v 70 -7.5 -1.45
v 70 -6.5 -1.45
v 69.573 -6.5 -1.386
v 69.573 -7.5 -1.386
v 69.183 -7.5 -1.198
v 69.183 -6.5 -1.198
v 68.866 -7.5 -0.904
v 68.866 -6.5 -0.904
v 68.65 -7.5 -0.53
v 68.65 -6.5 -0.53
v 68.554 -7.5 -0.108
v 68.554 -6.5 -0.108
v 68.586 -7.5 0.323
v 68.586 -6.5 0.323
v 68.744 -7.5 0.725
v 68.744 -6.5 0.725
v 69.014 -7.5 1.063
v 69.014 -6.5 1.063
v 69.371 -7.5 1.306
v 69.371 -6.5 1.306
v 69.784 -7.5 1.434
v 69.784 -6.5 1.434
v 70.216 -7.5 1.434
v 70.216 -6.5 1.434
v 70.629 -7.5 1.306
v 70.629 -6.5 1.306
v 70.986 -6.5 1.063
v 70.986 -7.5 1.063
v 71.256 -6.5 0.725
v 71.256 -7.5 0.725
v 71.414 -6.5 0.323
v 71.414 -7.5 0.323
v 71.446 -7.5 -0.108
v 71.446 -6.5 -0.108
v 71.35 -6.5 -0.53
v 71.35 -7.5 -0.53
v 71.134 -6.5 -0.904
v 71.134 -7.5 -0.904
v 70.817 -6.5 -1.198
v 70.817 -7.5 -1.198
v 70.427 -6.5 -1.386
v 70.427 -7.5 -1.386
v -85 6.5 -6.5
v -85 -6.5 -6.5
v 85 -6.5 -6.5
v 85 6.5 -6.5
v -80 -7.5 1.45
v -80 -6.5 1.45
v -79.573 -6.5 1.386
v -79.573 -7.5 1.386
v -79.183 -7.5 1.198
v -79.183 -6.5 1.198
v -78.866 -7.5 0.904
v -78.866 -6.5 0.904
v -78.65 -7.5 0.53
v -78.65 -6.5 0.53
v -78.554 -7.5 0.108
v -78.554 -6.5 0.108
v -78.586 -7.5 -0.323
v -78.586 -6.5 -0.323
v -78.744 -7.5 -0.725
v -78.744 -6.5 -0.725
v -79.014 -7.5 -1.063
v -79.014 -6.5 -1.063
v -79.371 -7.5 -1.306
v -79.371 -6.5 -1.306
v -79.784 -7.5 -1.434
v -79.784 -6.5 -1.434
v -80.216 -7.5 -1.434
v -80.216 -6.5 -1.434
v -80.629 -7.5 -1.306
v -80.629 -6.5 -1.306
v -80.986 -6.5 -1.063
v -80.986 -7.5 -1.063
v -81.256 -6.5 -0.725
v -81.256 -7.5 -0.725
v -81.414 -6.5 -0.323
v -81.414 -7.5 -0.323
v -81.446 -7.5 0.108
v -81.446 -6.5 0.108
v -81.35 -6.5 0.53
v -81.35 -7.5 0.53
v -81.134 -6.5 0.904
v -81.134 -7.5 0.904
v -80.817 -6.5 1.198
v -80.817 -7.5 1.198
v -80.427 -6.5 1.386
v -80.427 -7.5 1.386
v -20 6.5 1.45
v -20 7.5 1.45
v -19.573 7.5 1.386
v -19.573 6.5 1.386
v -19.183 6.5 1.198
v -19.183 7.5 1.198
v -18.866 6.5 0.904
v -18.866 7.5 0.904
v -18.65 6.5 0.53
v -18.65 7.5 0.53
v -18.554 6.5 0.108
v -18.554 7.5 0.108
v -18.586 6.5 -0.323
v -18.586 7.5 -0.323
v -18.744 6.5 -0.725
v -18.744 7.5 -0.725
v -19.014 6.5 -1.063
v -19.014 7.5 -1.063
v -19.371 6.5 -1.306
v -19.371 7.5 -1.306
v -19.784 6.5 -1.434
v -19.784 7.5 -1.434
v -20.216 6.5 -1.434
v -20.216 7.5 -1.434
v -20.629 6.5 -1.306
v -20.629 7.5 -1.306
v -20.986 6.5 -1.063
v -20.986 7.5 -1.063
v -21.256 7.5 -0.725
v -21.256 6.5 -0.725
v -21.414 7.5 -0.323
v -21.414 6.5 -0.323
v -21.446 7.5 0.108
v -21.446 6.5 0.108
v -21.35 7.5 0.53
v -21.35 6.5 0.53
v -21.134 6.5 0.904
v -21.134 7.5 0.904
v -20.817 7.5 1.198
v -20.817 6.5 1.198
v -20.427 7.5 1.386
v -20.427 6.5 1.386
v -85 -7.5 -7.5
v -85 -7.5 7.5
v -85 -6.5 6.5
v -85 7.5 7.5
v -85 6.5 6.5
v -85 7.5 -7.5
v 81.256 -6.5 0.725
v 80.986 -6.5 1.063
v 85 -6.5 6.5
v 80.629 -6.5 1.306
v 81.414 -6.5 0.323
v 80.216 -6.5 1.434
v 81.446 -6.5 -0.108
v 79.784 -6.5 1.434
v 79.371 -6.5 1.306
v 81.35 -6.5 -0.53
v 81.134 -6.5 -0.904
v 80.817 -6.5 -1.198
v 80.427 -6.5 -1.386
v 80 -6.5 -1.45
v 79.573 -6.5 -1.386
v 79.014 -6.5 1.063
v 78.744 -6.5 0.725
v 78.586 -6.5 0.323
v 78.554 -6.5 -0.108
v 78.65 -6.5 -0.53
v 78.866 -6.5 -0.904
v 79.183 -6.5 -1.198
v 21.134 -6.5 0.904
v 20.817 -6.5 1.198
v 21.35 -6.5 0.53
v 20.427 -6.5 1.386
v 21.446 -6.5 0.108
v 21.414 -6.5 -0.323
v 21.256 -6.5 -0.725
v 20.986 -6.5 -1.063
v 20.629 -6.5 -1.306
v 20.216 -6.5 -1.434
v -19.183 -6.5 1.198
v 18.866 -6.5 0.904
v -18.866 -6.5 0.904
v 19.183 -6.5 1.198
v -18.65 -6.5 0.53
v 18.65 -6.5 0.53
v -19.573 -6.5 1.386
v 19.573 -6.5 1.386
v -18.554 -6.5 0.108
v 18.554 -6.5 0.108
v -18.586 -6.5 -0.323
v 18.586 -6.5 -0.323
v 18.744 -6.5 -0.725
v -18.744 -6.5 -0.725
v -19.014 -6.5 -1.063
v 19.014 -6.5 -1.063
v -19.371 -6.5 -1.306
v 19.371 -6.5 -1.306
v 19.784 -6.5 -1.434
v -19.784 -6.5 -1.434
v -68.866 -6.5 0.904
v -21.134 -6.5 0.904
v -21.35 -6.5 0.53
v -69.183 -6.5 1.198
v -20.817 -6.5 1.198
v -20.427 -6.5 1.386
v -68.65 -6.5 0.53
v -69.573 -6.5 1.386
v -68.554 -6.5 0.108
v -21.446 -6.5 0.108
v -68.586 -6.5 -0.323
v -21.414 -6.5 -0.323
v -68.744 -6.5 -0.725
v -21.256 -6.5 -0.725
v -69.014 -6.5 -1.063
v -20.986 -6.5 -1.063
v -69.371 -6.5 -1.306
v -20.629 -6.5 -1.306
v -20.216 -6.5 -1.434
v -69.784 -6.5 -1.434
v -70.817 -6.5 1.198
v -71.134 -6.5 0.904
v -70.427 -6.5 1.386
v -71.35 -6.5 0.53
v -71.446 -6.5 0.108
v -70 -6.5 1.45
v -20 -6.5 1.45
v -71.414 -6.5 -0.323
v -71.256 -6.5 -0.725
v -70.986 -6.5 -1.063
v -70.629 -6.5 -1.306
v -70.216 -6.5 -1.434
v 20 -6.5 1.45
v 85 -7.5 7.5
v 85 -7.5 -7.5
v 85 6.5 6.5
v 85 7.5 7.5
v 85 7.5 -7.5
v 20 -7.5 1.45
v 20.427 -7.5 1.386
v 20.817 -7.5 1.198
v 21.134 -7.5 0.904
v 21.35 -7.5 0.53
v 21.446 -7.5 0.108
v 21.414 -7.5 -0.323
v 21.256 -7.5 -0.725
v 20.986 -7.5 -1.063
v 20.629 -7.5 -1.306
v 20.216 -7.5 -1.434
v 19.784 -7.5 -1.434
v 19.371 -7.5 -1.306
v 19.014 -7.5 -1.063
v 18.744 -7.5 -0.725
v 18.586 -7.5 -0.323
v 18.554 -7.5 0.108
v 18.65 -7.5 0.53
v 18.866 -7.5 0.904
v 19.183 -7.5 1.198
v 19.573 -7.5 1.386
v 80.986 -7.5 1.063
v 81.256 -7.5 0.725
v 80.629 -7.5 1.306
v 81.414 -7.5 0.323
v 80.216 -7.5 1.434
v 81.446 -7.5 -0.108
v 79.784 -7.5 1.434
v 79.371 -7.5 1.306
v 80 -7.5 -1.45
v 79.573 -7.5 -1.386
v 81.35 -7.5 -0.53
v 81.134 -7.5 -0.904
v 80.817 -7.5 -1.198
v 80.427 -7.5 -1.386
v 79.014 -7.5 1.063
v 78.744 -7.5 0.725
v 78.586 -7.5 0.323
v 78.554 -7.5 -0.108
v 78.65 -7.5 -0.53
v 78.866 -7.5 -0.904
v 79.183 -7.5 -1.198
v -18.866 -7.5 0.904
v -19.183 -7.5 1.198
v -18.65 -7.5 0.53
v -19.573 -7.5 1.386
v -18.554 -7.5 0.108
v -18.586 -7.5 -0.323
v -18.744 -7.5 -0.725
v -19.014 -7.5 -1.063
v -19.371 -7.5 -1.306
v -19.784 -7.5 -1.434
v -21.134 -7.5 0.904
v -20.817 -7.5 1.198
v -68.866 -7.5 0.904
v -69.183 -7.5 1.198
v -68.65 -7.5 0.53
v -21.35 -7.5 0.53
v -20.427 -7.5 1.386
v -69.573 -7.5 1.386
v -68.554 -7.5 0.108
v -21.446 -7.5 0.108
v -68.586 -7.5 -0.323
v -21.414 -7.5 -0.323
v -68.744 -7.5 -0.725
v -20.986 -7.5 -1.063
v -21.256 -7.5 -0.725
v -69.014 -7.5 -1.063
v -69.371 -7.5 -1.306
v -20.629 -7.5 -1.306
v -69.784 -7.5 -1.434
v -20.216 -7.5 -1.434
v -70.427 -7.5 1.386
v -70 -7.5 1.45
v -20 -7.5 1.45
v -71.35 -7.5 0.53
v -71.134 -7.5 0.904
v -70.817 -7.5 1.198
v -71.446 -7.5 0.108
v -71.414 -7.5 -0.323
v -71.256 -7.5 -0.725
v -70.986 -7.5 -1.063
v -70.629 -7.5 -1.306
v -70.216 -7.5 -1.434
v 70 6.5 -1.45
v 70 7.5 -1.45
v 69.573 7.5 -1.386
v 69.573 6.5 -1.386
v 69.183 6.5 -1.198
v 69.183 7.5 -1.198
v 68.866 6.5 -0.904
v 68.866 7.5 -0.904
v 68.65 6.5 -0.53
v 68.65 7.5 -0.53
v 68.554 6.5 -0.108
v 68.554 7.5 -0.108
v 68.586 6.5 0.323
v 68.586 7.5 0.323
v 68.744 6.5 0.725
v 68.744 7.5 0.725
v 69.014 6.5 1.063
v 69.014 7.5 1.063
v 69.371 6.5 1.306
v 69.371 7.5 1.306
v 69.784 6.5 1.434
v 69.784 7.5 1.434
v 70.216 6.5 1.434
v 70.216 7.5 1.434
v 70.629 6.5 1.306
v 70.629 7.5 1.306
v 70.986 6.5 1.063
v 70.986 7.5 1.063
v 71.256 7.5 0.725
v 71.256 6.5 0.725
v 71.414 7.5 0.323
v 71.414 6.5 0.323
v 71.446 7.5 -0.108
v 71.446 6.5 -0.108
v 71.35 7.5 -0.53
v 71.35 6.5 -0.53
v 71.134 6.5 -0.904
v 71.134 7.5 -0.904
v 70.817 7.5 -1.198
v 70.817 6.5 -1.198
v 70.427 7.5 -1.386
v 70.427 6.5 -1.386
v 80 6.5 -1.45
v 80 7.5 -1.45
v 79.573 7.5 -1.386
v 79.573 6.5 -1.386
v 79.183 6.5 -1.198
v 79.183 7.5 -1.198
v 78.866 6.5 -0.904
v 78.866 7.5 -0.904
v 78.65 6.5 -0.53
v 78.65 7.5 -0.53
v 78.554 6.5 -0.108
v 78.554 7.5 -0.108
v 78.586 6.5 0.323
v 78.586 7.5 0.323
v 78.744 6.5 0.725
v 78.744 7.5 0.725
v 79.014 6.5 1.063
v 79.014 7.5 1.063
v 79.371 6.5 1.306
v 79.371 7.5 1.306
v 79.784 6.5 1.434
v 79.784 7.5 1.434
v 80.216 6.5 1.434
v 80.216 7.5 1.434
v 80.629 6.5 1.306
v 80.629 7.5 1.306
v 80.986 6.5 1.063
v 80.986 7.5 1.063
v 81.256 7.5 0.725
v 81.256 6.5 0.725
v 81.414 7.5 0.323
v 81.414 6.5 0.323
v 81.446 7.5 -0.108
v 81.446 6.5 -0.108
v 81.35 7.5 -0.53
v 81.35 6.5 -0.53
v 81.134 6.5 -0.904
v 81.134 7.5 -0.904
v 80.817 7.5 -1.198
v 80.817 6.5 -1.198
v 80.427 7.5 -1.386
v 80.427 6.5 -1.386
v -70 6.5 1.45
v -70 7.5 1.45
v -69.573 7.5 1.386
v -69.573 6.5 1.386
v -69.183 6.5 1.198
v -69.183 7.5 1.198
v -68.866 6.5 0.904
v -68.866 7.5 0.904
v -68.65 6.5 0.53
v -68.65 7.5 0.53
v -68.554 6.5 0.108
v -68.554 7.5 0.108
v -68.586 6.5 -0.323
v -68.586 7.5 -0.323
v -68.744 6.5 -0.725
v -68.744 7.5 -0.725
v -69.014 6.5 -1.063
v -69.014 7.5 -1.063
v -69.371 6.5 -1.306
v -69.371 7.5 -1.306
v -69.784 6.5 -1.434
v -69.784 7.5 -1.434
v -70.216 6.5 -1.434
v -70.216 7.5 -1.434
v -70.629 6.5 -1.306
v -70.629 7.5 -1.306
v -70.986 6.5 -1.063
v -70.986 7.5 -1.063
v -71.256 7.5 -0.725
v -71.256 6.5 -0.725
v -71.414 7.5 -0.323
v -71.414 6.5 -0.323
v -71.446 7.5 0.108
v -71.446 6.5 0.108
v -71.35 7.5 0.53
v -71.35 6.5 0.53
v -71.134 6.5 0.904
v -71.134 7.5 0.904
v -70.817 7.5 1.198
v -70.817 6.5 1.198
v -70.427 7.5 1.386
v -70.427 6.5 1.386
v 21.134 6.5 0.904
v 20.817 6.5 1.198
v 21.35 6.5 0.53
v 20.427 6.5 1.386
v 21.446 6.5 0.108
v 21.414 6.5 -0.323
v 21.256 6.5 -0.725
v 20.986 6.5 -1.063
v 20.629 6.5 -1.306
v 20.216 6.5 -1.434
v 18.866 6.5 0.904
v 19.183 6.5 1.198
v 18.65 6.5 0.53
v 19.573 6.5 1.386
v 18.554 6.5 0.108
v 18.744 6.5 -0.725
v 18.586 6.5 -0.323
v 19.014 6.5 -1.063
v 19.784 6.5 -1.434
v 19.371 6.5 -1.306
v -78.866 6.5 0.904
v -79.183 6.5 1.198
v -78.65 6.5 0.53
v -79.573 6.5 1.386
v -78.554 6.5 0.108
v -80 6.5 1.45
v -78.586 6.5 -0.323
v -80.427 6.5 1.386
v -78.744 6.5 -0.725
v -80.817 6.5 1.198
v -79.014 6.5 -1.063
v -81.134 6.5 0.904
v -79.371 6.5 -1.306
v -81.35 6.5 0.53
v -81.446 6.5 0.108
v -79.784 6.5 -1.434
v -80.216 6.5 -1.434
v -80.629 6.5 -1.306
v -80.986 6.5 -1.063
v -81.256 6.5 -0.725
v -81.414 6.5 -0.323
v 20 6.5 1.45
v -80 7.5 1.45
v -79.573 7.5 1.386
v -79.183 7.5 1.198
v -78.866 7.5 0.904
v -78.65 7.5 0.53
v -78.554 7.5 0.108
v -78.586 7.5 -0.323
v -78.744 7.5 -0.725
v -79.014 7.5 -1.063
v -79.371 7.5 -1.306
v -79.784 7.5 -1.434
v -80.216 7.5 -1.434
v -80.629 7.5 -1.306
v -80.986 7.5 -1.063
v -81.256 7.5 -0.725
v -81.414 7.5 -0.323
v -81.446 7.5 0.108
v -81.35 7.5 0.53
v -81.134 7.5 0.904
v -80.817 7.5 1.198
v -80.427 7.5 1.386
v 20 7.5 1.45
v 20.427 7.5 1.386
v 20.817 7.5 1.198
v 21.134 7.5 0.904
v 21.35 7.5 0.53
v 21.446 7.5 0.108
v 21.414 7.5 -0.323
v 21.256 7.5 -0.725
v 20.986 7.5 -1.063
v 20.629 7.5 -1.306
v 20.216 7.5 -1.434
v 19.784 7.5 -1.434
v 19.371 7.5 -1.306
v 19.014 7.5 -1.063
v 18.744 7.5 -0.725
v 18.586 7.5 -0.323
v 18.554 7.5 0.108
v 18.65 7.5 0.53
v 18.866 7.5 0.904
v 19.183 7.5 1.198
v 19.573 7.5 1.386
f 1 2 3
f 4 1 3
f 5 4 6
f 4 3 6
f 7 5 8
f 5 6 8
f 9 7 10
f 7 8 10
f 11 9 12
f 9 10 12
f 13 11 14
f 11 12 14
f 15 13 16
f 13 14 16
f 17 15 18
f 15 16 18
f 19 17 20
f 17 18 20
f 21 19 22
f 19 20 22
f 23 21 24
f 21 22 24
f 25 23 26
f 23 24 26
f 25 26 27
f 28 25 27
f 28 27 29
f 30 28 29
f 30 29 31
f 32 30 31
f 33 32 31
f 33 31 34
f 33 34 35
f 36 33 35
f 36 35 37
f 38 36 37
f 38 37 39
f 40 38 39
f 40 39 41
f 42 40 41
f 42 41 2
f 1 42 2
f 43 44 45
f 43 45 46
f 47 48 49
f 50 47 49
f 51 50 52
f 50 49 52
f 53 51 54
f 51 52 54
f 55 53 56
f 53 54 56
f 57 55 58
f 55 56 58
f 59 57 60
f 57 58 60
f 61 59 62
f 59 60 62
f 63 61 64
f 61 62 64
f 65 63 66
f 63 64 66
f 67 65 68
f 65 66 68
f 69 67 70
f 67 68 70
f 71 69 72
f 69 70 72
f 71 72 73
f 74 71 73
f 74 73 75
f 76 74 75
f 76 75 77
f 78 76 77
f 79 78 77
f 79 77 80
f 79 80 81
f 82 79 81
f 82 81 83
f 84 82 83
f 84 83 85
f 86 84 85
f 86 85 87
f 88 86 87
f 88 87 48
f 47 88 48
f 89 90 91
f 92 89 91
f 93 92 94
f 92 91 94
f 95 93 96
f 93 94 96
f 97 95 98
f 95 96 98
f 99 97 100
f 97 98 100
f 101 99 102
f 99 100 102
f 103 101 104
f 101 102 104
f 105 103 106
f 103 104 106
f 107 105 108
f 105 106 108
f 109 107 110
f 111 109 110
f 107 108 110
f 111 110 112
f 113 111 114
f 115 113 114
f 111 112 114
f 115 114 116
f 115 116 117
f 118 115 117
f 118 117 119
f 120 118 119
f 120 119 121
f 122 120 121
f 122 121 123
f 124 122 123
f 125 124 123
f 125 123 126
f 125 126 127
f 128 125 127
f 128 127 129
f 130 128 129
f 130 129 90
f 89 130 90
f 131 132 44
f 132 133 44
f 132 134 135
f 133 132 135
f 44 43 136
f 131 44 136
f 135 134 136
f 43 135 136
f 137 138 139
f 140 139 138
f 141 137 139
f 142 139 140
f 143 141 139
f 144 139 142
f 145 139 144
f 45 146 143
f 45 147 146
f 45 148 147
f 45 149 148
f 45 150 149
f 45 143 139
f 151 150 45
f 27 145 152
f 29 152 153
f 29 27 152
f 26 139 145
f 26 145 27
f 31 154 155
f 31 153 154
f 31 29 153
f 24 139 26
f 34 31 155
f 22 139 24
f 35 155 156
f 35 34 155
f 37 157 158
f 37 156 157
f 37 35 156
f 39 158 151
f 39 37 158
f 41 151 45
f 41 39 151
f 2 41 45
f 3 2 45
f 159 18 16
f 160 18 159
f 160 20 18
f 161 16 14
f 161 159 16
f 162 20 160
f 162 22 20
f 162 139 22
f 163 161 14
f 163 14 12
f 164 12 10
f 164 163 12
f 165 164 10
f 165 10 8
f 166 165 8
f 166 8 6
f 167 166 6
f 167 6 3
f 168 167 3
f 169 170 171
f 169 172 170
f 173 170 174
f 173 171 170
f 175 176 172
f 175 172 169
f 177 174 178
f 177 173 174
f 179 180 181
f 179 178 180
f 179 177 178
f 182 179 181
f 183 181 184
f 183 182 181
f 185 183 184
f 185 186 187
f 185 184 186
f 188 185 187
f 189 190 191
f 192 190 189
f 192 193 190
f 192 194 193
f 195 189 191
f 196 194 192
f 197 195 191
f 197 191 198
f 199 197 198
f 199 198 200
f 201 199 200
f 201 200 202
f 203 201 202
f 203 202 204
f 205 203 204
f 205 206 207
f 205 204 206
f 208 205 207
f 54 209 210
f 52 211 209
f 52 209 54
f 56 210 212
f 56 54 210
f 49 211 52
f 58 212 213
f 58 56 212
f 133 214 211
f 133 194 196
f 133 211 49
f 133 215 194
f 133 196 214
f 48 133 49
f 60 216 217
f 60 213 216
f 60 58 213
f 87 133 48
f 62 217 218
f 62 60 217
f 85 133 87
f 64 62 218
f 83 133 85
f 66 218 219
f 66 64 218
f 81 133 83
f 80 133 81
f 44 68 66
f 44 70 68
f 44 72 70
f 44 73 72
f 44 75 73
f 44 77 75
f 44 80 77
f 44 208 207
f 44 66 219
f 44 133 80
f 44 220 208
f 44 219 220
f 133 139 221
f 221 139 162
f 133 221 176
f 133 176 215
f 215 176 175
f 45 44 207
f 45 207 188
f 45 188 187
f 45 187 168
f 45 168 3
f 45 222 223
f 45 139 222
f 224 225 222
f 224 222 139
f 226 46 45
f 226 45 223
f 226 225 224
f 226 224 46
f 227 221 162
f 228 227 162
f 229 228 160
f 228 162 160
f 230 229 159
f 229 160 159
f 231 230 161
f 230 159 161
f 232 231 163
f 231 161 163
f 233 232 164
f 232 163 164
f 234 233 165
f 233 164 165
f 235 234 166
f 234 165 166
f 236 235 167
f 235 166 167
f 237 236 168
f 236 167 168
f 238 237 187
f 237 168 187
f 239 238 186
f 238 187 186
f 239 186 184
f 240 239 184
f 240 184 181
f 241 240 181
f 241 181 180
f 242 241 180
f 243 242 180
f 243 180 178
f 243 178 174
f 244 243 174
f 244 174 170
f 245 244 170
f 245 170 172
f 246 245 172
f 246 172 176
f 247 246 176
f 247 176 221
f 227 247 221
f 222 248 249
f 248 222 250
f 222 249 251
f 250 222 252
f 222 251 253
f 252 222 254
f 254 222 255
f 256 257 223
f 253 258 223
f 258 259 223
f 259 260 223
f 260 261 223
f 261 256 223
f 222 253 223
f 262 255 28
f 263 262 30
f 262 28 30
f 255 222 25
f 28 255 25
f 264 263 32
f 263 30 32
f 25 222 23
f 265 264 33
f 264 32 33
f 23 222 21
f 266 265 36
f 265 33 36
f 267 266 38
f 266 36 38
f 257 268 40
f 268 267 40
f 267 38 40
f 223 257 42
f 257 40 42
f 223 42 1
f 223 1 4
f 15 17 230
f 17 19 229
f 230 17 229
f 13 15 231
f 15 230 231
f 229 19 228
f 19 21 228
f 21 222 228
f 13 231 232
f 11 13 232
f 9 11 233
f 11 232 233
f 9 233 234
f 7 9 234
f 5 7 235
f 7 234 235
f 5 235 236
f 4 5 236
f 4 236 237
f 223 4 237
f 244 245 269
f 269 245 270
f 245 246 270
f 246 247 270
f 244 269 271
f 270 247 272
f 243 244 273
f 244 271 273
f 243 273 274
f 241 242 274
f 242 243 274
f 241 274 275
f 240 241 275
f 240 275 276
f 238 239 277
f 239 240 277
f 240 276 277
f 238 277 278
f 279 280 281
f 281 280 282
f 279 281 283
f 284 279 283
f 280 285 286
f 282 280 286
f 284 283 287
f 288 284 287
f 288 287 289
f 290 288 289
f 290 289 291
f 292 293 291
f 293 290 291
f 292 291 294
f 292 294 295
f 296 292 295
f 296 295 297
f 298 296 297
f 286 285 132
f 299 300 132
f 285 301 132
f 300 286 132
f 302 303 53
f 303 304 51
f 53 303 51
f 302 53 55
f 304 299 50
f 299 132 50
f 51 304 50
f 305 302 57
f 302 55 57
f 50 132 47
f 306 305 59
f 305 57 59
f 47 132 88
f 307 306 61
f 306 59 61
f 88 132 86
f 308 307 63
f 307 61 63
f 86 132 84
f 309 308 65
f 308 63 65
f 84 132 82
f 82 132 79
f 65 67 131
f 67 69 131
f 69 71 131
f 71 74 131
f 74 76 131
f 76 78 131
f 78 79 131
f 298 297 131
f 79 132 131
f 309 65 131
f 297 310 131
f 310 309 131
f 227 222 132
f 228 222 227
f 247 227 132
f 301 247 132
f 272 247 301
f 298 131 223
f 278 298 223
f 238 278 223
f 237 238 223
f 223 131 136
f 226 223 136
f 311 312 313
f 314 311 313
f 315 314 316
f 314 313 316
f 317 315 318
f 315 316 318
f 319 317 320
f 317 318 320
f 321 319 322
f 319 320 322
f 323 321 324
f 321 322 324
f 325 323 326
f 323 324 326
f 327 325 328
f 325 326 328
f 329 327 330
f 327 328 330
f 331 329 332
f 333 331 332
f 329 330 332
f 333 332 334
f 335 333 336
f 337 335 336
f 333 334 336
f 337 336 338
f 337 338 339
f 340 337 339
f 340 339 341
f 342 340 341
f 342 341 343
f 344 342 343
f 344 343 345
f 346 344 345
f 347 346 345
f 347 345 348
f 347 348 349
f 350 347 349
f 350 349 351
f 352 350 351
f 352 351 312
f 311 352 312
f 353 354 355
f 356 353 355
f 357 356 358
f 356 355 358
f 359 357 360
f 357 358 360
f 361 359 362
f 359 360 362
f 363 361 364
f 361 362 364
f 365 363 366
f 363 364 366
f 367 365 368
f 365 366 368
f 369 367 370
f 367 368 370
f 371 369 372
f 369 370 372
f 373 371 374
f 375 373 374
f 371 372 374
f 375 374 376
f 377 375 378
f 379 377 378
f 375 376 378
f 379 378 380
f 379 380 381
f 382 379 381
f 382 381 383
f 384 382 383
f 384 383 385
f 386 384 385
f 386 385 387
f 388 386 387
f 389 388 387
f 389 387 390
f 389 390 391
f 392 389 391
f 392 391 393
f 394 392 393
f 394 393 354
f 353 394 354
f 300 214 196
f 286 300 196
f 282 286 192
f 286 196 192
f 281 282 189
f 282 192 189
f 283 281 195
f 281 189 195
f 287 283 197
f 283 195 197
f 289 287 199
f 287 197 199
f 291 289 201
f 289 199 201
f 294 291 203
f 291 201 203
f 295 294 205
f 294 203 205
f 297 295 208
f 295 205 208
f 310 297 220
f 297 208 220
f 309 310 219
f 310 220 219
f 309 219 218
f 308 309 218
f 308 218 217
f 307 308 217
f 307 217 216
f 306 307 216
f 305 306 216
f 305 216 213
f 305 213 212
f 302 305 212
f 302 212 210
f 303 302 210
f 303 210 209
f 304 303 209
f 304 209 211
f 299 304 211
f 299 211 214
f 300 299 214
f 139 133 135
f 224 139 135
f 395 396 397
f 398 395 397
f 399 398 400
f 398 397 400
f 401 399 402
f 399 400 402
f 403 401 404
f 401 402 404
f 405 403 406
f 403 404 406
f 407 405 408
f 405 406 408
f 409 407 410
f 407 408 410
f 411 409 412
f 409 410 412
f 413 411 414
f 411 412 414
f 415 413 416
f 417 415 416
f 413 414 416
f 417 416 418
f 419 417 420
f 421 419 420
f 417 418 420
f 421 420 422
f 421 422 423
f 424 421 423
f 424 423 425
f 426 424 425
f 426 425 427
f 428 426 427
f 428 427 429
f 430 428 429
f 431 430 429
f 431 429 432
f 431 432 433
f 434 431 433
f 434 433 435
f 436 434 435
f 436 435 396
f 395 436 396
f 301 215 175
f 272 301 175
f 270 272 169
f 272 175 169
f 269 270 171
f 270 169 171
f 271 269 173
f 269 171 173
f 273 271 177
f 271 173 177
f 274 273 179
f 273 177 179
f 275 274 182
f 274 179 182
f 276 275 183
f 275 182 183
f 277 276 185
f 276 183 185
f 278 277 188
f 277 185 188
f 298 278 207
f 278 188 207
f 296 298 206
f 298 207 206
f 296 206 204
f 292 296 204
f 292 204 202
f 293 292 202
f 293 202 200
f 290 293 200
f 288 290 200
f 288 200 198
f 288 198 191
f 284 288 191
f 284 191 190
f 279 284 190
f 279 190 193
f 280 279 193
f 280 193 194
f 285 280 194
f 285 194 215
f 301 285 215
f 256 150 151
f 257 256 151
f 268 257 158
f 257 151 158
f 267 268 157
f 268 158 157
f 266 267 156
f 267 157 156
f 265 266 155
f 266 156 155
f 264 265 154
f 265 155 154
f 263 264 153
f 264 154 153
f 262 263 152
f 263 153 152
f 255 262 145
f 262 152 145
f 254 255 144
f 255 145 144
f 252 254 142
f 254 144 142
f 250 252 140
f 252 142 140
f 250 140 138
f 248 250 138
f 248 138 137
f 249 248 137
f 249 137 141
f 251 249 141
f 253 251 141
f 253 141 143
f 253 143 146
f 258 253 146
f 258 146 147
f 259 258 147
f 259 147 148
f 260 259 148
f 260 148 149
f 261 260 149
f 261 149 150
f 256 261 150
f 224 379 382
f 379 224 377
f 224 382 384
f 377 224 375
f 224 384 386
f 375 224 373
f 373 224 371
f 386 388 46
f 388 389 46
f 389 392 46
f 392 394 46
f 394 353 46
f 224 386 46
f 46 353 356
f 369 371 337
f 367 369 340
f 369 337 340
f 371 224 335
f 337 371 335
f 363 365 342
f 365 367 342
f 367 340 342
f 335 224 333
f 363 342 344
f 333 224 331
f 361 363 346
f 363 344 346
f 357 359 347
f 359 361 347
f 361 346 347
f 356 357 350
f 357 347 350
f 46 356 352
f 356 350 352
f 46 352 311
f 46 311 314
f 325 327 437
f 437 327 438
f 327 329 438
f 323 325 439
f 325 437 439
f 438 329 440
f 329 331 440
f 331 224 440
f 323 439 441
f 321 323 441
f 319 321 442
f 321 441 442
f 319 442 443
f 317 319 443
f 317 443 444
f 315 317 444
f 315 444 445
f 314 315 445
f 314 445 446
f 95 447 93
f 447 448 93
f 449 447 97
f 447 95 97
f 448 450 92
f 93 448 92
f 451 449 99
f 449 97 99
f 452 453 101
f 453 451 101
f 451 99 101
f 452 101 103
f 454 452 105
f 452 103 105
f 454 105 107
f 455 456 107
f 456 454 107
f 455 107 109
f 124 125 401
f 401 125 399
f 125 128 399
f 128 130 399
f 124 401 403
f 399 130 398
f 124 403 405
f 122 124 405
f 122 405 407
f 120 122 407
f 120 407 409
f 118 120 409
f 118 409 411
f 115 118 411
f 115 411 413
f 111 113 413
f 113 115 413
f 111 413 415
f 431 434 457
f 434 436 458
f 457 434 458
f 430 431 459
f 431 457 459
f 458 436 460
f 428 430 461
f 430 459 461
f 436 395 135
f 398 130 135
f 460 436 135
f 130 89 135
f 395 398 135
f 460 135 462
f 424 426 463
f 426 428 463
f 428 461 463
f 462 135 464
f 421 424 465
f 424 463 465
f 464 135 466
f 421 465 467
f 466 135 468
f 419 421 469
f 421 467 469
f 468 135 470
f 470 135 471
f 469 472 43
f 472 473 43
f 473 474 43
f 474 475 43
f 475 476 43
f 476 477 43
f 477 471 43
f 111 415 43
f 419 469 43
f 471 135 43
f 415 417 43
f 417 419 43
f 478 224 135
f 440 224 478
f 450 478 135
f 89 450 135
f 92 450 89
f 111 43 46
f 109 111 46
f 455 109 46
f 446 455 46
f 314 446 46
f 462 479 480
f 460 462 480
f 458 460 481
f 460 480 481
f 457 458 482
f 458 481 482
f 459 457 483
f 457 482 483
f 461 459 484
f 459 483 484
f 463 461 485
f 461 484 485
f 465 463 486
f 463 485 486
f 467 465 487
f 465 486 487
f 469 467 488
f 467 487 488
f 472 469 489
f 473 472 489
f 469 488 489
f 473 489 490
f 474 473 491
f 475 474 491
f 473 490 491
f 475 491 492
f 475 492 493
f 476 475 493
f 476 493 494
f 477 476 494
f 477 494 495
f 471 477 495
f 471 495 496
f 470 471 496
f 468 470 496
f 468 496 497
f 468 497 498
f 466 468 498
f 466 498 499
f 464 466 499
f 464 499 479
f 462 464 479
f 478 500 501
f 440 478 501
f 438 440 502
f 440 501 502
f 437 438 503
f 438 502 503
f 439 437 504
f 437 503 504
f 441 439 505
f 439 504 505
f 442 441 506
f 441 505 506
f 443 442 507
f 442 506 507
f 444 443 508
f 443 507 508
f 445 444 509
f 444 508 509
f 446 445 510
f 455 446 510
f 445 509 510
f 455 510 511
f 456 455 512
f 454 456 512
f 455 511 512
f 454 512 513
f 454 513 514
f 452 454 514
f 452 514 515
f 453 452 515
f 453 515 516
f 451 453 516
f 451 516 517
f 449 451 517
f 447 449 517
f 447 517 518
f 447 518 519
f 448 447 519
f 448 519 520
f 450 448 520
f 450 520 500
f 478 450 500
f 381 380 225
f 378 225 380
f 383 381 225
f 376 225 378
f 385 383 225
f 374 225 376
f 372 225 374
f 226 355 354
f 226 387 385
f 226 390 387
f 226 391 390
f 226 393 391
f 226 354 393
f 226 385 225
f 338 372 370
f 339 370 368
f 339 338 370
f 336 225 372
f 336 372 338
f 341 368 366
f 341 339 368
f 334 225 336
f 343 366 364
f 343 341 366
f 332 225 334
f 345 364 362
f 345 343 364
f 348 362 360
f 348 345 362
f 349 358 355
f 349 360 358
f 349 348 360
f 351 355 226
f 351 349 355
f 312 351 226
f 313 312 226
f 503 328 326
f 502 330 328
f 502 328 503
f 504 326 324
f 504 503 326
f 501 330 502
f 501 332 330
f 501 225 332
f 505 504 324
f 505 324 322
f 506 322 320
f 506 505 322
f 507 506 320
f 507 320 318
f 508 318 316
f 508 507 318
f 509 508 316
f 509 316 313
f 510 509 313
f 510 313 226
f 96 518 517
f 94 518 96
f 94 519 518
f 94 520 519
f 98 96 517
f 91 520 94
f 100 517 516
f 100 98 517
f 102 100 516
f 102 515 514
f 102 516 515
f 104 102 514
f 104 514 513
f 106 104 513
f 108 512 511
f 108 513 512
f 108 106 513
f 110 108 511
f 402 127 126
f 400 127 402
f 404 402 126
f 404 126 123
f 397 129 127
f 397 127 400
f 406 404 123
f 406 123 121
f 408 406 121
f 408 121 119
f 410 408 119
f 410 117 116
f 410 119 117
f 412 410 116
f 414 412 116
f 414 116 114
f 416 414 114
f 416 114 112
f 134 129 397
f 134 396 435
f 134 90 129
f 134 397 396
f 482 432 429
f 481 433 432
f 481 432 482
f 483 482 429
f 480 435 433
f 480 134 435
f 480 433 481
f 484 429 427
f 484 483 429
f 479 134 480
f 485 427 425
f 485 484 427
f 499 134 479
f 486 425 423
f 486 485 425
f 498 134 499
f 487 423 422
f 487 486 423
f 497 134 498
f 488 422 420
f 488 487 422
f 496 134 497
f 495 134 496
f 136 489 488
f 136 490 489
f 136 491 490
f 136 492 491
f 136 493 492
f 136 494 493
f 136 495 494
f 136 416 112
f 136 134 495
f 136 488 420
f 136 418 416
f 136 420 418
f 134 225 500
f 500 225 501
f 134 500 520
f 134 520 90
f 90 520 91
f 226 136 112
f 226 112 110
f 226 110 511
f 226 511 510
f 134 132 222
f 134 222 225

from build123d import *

# Parameters (mm, degrees)
SKETCH_11_W         = 15
SKETCH_11_H         = 15
SKETCH_11_W_2       = 13
SKETCH_11_H_2       = 13
F_15X15X1_1_DEPTH   = 170
SKETCH_13_R         = 1.45
CUT_EXTRUDE_2_DEPTH = 87.638617256
SKETCH_14_R         = 1.45
CUT_EXTRUDE_3_DEPTH = 87.638617256


with BuildPart() as part:
    # 草图11 → 铝管 15X15X1(1) (new body)
    with BuildSketch(Plane(origin=(-85, 0, 0), x_dir=(0, 0, -1), z_dir=(1, 0, 0))):
        Rectangle(SKETCH_11_W, SKETCH_11_H)
        Rectangle(SKETCH_11_W_2, SKETCH_11_H_2, mode=Mode.SUBTRACT)
    extrude(amount=F_15X15X1_1_DEPTH)

    # 草图13 → 切除-拉伸2 (cut, through all)
    with BuildSketch(Plane(origin=(0, 7.5, 0), x_dir=(1, 0, 0), z_dir=(0, 1, 0))):
        with Locations(Location((-80, 0, 0), (0, 0, 270))):
            Circle(SKETCH_13_R)
        with Locations(Location((-70, 0, 0), (0, 0, 270))):
            Circle(SKETCH_13_R)
        with Locations(Location((70, 0, 0), (0, 0, 90))):
            Circle(SKETCH_13_R)
        with Locations(Location((80, 0, 0), (0, 0, 90))):
            Circle(SKETCH_13_R)
    extrude(amount=-CUT_EXTRUDE_2_DEPTH, mode=Mode.SUBTRACT)

    # 草图14 → 切除-拉伸3 (cut, through all)
    with BuildSketch(Plane(origin=(0, 7.5, 0), x_dir=(1, 0, 0), z_dir=(0, 1, 0))):
        with Locations(Location((-20, 0, 0), (0, 0, 270))):
            Circle(SKETCH_14_R)
        with Locations(Location((20, 0, 0), (0, 0, 270))):
            Circle(SKETCH_14_R)
    extrude(amount=-CUT_EXTRUDE_3_DEPTH, mode=Mode.SUBTRACT)


solid = part.part
